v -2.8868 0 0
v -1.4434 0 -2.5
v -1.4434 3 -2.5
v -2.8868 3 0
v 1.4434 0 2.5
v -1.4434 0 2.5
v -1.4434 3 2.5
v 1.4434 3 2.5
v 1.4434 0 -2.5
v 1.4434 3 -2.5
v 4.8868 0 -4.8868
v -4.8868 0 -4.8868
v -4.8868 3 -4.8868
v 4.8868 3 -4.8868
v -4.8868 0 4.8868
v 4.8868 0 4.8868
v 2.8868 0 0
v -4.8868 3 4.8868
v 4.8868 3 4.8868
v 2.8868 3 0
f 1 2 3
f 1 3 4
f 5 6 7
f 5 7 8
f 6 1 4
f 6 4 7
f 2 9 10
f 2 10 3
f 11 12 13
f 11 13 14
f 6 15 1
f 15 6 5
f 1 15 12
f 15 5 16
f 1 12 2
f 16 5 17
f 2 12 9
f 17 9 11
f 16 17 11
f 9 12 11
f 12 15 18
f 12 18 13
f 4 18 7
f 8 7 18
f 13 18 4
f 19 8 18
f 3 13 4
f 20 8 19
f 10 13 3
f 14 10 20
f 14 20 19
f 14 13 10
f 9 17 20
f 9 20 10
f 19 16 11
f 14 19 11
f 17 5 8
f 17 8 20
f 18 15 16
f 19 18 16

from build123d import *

# Parameters (mm, degrees)
ESBO_O1_W                = 9.773502692
ESBO_O1_H                = 9.773502692
RESSALTO_EXTRUS_O1_DEPTH = 3


with BuildPart() as part:
    # Esboço1 → Ressalto-extrusão1 (new body)
    with BuildSketch(Plane(origin=(0, 0, 0), x_dir=(1, 0, 0), z_dir=(0, 1, 0))):
        Rectangle(ESBO_O1_W, ESBO_O1_H)
        Polygon((1.443375673, 2.5), (-1.443375673, 2.5), (-2.886751346, 0), (-1.443375673, -2.5), (1.443375673, -2.5), (2.886751346, 0), align=None, mode=Mode.SUBTRACT)
    extrude(amount=RESSALTO_EXTRUS_O1_DEPTH)


solid = part.part
